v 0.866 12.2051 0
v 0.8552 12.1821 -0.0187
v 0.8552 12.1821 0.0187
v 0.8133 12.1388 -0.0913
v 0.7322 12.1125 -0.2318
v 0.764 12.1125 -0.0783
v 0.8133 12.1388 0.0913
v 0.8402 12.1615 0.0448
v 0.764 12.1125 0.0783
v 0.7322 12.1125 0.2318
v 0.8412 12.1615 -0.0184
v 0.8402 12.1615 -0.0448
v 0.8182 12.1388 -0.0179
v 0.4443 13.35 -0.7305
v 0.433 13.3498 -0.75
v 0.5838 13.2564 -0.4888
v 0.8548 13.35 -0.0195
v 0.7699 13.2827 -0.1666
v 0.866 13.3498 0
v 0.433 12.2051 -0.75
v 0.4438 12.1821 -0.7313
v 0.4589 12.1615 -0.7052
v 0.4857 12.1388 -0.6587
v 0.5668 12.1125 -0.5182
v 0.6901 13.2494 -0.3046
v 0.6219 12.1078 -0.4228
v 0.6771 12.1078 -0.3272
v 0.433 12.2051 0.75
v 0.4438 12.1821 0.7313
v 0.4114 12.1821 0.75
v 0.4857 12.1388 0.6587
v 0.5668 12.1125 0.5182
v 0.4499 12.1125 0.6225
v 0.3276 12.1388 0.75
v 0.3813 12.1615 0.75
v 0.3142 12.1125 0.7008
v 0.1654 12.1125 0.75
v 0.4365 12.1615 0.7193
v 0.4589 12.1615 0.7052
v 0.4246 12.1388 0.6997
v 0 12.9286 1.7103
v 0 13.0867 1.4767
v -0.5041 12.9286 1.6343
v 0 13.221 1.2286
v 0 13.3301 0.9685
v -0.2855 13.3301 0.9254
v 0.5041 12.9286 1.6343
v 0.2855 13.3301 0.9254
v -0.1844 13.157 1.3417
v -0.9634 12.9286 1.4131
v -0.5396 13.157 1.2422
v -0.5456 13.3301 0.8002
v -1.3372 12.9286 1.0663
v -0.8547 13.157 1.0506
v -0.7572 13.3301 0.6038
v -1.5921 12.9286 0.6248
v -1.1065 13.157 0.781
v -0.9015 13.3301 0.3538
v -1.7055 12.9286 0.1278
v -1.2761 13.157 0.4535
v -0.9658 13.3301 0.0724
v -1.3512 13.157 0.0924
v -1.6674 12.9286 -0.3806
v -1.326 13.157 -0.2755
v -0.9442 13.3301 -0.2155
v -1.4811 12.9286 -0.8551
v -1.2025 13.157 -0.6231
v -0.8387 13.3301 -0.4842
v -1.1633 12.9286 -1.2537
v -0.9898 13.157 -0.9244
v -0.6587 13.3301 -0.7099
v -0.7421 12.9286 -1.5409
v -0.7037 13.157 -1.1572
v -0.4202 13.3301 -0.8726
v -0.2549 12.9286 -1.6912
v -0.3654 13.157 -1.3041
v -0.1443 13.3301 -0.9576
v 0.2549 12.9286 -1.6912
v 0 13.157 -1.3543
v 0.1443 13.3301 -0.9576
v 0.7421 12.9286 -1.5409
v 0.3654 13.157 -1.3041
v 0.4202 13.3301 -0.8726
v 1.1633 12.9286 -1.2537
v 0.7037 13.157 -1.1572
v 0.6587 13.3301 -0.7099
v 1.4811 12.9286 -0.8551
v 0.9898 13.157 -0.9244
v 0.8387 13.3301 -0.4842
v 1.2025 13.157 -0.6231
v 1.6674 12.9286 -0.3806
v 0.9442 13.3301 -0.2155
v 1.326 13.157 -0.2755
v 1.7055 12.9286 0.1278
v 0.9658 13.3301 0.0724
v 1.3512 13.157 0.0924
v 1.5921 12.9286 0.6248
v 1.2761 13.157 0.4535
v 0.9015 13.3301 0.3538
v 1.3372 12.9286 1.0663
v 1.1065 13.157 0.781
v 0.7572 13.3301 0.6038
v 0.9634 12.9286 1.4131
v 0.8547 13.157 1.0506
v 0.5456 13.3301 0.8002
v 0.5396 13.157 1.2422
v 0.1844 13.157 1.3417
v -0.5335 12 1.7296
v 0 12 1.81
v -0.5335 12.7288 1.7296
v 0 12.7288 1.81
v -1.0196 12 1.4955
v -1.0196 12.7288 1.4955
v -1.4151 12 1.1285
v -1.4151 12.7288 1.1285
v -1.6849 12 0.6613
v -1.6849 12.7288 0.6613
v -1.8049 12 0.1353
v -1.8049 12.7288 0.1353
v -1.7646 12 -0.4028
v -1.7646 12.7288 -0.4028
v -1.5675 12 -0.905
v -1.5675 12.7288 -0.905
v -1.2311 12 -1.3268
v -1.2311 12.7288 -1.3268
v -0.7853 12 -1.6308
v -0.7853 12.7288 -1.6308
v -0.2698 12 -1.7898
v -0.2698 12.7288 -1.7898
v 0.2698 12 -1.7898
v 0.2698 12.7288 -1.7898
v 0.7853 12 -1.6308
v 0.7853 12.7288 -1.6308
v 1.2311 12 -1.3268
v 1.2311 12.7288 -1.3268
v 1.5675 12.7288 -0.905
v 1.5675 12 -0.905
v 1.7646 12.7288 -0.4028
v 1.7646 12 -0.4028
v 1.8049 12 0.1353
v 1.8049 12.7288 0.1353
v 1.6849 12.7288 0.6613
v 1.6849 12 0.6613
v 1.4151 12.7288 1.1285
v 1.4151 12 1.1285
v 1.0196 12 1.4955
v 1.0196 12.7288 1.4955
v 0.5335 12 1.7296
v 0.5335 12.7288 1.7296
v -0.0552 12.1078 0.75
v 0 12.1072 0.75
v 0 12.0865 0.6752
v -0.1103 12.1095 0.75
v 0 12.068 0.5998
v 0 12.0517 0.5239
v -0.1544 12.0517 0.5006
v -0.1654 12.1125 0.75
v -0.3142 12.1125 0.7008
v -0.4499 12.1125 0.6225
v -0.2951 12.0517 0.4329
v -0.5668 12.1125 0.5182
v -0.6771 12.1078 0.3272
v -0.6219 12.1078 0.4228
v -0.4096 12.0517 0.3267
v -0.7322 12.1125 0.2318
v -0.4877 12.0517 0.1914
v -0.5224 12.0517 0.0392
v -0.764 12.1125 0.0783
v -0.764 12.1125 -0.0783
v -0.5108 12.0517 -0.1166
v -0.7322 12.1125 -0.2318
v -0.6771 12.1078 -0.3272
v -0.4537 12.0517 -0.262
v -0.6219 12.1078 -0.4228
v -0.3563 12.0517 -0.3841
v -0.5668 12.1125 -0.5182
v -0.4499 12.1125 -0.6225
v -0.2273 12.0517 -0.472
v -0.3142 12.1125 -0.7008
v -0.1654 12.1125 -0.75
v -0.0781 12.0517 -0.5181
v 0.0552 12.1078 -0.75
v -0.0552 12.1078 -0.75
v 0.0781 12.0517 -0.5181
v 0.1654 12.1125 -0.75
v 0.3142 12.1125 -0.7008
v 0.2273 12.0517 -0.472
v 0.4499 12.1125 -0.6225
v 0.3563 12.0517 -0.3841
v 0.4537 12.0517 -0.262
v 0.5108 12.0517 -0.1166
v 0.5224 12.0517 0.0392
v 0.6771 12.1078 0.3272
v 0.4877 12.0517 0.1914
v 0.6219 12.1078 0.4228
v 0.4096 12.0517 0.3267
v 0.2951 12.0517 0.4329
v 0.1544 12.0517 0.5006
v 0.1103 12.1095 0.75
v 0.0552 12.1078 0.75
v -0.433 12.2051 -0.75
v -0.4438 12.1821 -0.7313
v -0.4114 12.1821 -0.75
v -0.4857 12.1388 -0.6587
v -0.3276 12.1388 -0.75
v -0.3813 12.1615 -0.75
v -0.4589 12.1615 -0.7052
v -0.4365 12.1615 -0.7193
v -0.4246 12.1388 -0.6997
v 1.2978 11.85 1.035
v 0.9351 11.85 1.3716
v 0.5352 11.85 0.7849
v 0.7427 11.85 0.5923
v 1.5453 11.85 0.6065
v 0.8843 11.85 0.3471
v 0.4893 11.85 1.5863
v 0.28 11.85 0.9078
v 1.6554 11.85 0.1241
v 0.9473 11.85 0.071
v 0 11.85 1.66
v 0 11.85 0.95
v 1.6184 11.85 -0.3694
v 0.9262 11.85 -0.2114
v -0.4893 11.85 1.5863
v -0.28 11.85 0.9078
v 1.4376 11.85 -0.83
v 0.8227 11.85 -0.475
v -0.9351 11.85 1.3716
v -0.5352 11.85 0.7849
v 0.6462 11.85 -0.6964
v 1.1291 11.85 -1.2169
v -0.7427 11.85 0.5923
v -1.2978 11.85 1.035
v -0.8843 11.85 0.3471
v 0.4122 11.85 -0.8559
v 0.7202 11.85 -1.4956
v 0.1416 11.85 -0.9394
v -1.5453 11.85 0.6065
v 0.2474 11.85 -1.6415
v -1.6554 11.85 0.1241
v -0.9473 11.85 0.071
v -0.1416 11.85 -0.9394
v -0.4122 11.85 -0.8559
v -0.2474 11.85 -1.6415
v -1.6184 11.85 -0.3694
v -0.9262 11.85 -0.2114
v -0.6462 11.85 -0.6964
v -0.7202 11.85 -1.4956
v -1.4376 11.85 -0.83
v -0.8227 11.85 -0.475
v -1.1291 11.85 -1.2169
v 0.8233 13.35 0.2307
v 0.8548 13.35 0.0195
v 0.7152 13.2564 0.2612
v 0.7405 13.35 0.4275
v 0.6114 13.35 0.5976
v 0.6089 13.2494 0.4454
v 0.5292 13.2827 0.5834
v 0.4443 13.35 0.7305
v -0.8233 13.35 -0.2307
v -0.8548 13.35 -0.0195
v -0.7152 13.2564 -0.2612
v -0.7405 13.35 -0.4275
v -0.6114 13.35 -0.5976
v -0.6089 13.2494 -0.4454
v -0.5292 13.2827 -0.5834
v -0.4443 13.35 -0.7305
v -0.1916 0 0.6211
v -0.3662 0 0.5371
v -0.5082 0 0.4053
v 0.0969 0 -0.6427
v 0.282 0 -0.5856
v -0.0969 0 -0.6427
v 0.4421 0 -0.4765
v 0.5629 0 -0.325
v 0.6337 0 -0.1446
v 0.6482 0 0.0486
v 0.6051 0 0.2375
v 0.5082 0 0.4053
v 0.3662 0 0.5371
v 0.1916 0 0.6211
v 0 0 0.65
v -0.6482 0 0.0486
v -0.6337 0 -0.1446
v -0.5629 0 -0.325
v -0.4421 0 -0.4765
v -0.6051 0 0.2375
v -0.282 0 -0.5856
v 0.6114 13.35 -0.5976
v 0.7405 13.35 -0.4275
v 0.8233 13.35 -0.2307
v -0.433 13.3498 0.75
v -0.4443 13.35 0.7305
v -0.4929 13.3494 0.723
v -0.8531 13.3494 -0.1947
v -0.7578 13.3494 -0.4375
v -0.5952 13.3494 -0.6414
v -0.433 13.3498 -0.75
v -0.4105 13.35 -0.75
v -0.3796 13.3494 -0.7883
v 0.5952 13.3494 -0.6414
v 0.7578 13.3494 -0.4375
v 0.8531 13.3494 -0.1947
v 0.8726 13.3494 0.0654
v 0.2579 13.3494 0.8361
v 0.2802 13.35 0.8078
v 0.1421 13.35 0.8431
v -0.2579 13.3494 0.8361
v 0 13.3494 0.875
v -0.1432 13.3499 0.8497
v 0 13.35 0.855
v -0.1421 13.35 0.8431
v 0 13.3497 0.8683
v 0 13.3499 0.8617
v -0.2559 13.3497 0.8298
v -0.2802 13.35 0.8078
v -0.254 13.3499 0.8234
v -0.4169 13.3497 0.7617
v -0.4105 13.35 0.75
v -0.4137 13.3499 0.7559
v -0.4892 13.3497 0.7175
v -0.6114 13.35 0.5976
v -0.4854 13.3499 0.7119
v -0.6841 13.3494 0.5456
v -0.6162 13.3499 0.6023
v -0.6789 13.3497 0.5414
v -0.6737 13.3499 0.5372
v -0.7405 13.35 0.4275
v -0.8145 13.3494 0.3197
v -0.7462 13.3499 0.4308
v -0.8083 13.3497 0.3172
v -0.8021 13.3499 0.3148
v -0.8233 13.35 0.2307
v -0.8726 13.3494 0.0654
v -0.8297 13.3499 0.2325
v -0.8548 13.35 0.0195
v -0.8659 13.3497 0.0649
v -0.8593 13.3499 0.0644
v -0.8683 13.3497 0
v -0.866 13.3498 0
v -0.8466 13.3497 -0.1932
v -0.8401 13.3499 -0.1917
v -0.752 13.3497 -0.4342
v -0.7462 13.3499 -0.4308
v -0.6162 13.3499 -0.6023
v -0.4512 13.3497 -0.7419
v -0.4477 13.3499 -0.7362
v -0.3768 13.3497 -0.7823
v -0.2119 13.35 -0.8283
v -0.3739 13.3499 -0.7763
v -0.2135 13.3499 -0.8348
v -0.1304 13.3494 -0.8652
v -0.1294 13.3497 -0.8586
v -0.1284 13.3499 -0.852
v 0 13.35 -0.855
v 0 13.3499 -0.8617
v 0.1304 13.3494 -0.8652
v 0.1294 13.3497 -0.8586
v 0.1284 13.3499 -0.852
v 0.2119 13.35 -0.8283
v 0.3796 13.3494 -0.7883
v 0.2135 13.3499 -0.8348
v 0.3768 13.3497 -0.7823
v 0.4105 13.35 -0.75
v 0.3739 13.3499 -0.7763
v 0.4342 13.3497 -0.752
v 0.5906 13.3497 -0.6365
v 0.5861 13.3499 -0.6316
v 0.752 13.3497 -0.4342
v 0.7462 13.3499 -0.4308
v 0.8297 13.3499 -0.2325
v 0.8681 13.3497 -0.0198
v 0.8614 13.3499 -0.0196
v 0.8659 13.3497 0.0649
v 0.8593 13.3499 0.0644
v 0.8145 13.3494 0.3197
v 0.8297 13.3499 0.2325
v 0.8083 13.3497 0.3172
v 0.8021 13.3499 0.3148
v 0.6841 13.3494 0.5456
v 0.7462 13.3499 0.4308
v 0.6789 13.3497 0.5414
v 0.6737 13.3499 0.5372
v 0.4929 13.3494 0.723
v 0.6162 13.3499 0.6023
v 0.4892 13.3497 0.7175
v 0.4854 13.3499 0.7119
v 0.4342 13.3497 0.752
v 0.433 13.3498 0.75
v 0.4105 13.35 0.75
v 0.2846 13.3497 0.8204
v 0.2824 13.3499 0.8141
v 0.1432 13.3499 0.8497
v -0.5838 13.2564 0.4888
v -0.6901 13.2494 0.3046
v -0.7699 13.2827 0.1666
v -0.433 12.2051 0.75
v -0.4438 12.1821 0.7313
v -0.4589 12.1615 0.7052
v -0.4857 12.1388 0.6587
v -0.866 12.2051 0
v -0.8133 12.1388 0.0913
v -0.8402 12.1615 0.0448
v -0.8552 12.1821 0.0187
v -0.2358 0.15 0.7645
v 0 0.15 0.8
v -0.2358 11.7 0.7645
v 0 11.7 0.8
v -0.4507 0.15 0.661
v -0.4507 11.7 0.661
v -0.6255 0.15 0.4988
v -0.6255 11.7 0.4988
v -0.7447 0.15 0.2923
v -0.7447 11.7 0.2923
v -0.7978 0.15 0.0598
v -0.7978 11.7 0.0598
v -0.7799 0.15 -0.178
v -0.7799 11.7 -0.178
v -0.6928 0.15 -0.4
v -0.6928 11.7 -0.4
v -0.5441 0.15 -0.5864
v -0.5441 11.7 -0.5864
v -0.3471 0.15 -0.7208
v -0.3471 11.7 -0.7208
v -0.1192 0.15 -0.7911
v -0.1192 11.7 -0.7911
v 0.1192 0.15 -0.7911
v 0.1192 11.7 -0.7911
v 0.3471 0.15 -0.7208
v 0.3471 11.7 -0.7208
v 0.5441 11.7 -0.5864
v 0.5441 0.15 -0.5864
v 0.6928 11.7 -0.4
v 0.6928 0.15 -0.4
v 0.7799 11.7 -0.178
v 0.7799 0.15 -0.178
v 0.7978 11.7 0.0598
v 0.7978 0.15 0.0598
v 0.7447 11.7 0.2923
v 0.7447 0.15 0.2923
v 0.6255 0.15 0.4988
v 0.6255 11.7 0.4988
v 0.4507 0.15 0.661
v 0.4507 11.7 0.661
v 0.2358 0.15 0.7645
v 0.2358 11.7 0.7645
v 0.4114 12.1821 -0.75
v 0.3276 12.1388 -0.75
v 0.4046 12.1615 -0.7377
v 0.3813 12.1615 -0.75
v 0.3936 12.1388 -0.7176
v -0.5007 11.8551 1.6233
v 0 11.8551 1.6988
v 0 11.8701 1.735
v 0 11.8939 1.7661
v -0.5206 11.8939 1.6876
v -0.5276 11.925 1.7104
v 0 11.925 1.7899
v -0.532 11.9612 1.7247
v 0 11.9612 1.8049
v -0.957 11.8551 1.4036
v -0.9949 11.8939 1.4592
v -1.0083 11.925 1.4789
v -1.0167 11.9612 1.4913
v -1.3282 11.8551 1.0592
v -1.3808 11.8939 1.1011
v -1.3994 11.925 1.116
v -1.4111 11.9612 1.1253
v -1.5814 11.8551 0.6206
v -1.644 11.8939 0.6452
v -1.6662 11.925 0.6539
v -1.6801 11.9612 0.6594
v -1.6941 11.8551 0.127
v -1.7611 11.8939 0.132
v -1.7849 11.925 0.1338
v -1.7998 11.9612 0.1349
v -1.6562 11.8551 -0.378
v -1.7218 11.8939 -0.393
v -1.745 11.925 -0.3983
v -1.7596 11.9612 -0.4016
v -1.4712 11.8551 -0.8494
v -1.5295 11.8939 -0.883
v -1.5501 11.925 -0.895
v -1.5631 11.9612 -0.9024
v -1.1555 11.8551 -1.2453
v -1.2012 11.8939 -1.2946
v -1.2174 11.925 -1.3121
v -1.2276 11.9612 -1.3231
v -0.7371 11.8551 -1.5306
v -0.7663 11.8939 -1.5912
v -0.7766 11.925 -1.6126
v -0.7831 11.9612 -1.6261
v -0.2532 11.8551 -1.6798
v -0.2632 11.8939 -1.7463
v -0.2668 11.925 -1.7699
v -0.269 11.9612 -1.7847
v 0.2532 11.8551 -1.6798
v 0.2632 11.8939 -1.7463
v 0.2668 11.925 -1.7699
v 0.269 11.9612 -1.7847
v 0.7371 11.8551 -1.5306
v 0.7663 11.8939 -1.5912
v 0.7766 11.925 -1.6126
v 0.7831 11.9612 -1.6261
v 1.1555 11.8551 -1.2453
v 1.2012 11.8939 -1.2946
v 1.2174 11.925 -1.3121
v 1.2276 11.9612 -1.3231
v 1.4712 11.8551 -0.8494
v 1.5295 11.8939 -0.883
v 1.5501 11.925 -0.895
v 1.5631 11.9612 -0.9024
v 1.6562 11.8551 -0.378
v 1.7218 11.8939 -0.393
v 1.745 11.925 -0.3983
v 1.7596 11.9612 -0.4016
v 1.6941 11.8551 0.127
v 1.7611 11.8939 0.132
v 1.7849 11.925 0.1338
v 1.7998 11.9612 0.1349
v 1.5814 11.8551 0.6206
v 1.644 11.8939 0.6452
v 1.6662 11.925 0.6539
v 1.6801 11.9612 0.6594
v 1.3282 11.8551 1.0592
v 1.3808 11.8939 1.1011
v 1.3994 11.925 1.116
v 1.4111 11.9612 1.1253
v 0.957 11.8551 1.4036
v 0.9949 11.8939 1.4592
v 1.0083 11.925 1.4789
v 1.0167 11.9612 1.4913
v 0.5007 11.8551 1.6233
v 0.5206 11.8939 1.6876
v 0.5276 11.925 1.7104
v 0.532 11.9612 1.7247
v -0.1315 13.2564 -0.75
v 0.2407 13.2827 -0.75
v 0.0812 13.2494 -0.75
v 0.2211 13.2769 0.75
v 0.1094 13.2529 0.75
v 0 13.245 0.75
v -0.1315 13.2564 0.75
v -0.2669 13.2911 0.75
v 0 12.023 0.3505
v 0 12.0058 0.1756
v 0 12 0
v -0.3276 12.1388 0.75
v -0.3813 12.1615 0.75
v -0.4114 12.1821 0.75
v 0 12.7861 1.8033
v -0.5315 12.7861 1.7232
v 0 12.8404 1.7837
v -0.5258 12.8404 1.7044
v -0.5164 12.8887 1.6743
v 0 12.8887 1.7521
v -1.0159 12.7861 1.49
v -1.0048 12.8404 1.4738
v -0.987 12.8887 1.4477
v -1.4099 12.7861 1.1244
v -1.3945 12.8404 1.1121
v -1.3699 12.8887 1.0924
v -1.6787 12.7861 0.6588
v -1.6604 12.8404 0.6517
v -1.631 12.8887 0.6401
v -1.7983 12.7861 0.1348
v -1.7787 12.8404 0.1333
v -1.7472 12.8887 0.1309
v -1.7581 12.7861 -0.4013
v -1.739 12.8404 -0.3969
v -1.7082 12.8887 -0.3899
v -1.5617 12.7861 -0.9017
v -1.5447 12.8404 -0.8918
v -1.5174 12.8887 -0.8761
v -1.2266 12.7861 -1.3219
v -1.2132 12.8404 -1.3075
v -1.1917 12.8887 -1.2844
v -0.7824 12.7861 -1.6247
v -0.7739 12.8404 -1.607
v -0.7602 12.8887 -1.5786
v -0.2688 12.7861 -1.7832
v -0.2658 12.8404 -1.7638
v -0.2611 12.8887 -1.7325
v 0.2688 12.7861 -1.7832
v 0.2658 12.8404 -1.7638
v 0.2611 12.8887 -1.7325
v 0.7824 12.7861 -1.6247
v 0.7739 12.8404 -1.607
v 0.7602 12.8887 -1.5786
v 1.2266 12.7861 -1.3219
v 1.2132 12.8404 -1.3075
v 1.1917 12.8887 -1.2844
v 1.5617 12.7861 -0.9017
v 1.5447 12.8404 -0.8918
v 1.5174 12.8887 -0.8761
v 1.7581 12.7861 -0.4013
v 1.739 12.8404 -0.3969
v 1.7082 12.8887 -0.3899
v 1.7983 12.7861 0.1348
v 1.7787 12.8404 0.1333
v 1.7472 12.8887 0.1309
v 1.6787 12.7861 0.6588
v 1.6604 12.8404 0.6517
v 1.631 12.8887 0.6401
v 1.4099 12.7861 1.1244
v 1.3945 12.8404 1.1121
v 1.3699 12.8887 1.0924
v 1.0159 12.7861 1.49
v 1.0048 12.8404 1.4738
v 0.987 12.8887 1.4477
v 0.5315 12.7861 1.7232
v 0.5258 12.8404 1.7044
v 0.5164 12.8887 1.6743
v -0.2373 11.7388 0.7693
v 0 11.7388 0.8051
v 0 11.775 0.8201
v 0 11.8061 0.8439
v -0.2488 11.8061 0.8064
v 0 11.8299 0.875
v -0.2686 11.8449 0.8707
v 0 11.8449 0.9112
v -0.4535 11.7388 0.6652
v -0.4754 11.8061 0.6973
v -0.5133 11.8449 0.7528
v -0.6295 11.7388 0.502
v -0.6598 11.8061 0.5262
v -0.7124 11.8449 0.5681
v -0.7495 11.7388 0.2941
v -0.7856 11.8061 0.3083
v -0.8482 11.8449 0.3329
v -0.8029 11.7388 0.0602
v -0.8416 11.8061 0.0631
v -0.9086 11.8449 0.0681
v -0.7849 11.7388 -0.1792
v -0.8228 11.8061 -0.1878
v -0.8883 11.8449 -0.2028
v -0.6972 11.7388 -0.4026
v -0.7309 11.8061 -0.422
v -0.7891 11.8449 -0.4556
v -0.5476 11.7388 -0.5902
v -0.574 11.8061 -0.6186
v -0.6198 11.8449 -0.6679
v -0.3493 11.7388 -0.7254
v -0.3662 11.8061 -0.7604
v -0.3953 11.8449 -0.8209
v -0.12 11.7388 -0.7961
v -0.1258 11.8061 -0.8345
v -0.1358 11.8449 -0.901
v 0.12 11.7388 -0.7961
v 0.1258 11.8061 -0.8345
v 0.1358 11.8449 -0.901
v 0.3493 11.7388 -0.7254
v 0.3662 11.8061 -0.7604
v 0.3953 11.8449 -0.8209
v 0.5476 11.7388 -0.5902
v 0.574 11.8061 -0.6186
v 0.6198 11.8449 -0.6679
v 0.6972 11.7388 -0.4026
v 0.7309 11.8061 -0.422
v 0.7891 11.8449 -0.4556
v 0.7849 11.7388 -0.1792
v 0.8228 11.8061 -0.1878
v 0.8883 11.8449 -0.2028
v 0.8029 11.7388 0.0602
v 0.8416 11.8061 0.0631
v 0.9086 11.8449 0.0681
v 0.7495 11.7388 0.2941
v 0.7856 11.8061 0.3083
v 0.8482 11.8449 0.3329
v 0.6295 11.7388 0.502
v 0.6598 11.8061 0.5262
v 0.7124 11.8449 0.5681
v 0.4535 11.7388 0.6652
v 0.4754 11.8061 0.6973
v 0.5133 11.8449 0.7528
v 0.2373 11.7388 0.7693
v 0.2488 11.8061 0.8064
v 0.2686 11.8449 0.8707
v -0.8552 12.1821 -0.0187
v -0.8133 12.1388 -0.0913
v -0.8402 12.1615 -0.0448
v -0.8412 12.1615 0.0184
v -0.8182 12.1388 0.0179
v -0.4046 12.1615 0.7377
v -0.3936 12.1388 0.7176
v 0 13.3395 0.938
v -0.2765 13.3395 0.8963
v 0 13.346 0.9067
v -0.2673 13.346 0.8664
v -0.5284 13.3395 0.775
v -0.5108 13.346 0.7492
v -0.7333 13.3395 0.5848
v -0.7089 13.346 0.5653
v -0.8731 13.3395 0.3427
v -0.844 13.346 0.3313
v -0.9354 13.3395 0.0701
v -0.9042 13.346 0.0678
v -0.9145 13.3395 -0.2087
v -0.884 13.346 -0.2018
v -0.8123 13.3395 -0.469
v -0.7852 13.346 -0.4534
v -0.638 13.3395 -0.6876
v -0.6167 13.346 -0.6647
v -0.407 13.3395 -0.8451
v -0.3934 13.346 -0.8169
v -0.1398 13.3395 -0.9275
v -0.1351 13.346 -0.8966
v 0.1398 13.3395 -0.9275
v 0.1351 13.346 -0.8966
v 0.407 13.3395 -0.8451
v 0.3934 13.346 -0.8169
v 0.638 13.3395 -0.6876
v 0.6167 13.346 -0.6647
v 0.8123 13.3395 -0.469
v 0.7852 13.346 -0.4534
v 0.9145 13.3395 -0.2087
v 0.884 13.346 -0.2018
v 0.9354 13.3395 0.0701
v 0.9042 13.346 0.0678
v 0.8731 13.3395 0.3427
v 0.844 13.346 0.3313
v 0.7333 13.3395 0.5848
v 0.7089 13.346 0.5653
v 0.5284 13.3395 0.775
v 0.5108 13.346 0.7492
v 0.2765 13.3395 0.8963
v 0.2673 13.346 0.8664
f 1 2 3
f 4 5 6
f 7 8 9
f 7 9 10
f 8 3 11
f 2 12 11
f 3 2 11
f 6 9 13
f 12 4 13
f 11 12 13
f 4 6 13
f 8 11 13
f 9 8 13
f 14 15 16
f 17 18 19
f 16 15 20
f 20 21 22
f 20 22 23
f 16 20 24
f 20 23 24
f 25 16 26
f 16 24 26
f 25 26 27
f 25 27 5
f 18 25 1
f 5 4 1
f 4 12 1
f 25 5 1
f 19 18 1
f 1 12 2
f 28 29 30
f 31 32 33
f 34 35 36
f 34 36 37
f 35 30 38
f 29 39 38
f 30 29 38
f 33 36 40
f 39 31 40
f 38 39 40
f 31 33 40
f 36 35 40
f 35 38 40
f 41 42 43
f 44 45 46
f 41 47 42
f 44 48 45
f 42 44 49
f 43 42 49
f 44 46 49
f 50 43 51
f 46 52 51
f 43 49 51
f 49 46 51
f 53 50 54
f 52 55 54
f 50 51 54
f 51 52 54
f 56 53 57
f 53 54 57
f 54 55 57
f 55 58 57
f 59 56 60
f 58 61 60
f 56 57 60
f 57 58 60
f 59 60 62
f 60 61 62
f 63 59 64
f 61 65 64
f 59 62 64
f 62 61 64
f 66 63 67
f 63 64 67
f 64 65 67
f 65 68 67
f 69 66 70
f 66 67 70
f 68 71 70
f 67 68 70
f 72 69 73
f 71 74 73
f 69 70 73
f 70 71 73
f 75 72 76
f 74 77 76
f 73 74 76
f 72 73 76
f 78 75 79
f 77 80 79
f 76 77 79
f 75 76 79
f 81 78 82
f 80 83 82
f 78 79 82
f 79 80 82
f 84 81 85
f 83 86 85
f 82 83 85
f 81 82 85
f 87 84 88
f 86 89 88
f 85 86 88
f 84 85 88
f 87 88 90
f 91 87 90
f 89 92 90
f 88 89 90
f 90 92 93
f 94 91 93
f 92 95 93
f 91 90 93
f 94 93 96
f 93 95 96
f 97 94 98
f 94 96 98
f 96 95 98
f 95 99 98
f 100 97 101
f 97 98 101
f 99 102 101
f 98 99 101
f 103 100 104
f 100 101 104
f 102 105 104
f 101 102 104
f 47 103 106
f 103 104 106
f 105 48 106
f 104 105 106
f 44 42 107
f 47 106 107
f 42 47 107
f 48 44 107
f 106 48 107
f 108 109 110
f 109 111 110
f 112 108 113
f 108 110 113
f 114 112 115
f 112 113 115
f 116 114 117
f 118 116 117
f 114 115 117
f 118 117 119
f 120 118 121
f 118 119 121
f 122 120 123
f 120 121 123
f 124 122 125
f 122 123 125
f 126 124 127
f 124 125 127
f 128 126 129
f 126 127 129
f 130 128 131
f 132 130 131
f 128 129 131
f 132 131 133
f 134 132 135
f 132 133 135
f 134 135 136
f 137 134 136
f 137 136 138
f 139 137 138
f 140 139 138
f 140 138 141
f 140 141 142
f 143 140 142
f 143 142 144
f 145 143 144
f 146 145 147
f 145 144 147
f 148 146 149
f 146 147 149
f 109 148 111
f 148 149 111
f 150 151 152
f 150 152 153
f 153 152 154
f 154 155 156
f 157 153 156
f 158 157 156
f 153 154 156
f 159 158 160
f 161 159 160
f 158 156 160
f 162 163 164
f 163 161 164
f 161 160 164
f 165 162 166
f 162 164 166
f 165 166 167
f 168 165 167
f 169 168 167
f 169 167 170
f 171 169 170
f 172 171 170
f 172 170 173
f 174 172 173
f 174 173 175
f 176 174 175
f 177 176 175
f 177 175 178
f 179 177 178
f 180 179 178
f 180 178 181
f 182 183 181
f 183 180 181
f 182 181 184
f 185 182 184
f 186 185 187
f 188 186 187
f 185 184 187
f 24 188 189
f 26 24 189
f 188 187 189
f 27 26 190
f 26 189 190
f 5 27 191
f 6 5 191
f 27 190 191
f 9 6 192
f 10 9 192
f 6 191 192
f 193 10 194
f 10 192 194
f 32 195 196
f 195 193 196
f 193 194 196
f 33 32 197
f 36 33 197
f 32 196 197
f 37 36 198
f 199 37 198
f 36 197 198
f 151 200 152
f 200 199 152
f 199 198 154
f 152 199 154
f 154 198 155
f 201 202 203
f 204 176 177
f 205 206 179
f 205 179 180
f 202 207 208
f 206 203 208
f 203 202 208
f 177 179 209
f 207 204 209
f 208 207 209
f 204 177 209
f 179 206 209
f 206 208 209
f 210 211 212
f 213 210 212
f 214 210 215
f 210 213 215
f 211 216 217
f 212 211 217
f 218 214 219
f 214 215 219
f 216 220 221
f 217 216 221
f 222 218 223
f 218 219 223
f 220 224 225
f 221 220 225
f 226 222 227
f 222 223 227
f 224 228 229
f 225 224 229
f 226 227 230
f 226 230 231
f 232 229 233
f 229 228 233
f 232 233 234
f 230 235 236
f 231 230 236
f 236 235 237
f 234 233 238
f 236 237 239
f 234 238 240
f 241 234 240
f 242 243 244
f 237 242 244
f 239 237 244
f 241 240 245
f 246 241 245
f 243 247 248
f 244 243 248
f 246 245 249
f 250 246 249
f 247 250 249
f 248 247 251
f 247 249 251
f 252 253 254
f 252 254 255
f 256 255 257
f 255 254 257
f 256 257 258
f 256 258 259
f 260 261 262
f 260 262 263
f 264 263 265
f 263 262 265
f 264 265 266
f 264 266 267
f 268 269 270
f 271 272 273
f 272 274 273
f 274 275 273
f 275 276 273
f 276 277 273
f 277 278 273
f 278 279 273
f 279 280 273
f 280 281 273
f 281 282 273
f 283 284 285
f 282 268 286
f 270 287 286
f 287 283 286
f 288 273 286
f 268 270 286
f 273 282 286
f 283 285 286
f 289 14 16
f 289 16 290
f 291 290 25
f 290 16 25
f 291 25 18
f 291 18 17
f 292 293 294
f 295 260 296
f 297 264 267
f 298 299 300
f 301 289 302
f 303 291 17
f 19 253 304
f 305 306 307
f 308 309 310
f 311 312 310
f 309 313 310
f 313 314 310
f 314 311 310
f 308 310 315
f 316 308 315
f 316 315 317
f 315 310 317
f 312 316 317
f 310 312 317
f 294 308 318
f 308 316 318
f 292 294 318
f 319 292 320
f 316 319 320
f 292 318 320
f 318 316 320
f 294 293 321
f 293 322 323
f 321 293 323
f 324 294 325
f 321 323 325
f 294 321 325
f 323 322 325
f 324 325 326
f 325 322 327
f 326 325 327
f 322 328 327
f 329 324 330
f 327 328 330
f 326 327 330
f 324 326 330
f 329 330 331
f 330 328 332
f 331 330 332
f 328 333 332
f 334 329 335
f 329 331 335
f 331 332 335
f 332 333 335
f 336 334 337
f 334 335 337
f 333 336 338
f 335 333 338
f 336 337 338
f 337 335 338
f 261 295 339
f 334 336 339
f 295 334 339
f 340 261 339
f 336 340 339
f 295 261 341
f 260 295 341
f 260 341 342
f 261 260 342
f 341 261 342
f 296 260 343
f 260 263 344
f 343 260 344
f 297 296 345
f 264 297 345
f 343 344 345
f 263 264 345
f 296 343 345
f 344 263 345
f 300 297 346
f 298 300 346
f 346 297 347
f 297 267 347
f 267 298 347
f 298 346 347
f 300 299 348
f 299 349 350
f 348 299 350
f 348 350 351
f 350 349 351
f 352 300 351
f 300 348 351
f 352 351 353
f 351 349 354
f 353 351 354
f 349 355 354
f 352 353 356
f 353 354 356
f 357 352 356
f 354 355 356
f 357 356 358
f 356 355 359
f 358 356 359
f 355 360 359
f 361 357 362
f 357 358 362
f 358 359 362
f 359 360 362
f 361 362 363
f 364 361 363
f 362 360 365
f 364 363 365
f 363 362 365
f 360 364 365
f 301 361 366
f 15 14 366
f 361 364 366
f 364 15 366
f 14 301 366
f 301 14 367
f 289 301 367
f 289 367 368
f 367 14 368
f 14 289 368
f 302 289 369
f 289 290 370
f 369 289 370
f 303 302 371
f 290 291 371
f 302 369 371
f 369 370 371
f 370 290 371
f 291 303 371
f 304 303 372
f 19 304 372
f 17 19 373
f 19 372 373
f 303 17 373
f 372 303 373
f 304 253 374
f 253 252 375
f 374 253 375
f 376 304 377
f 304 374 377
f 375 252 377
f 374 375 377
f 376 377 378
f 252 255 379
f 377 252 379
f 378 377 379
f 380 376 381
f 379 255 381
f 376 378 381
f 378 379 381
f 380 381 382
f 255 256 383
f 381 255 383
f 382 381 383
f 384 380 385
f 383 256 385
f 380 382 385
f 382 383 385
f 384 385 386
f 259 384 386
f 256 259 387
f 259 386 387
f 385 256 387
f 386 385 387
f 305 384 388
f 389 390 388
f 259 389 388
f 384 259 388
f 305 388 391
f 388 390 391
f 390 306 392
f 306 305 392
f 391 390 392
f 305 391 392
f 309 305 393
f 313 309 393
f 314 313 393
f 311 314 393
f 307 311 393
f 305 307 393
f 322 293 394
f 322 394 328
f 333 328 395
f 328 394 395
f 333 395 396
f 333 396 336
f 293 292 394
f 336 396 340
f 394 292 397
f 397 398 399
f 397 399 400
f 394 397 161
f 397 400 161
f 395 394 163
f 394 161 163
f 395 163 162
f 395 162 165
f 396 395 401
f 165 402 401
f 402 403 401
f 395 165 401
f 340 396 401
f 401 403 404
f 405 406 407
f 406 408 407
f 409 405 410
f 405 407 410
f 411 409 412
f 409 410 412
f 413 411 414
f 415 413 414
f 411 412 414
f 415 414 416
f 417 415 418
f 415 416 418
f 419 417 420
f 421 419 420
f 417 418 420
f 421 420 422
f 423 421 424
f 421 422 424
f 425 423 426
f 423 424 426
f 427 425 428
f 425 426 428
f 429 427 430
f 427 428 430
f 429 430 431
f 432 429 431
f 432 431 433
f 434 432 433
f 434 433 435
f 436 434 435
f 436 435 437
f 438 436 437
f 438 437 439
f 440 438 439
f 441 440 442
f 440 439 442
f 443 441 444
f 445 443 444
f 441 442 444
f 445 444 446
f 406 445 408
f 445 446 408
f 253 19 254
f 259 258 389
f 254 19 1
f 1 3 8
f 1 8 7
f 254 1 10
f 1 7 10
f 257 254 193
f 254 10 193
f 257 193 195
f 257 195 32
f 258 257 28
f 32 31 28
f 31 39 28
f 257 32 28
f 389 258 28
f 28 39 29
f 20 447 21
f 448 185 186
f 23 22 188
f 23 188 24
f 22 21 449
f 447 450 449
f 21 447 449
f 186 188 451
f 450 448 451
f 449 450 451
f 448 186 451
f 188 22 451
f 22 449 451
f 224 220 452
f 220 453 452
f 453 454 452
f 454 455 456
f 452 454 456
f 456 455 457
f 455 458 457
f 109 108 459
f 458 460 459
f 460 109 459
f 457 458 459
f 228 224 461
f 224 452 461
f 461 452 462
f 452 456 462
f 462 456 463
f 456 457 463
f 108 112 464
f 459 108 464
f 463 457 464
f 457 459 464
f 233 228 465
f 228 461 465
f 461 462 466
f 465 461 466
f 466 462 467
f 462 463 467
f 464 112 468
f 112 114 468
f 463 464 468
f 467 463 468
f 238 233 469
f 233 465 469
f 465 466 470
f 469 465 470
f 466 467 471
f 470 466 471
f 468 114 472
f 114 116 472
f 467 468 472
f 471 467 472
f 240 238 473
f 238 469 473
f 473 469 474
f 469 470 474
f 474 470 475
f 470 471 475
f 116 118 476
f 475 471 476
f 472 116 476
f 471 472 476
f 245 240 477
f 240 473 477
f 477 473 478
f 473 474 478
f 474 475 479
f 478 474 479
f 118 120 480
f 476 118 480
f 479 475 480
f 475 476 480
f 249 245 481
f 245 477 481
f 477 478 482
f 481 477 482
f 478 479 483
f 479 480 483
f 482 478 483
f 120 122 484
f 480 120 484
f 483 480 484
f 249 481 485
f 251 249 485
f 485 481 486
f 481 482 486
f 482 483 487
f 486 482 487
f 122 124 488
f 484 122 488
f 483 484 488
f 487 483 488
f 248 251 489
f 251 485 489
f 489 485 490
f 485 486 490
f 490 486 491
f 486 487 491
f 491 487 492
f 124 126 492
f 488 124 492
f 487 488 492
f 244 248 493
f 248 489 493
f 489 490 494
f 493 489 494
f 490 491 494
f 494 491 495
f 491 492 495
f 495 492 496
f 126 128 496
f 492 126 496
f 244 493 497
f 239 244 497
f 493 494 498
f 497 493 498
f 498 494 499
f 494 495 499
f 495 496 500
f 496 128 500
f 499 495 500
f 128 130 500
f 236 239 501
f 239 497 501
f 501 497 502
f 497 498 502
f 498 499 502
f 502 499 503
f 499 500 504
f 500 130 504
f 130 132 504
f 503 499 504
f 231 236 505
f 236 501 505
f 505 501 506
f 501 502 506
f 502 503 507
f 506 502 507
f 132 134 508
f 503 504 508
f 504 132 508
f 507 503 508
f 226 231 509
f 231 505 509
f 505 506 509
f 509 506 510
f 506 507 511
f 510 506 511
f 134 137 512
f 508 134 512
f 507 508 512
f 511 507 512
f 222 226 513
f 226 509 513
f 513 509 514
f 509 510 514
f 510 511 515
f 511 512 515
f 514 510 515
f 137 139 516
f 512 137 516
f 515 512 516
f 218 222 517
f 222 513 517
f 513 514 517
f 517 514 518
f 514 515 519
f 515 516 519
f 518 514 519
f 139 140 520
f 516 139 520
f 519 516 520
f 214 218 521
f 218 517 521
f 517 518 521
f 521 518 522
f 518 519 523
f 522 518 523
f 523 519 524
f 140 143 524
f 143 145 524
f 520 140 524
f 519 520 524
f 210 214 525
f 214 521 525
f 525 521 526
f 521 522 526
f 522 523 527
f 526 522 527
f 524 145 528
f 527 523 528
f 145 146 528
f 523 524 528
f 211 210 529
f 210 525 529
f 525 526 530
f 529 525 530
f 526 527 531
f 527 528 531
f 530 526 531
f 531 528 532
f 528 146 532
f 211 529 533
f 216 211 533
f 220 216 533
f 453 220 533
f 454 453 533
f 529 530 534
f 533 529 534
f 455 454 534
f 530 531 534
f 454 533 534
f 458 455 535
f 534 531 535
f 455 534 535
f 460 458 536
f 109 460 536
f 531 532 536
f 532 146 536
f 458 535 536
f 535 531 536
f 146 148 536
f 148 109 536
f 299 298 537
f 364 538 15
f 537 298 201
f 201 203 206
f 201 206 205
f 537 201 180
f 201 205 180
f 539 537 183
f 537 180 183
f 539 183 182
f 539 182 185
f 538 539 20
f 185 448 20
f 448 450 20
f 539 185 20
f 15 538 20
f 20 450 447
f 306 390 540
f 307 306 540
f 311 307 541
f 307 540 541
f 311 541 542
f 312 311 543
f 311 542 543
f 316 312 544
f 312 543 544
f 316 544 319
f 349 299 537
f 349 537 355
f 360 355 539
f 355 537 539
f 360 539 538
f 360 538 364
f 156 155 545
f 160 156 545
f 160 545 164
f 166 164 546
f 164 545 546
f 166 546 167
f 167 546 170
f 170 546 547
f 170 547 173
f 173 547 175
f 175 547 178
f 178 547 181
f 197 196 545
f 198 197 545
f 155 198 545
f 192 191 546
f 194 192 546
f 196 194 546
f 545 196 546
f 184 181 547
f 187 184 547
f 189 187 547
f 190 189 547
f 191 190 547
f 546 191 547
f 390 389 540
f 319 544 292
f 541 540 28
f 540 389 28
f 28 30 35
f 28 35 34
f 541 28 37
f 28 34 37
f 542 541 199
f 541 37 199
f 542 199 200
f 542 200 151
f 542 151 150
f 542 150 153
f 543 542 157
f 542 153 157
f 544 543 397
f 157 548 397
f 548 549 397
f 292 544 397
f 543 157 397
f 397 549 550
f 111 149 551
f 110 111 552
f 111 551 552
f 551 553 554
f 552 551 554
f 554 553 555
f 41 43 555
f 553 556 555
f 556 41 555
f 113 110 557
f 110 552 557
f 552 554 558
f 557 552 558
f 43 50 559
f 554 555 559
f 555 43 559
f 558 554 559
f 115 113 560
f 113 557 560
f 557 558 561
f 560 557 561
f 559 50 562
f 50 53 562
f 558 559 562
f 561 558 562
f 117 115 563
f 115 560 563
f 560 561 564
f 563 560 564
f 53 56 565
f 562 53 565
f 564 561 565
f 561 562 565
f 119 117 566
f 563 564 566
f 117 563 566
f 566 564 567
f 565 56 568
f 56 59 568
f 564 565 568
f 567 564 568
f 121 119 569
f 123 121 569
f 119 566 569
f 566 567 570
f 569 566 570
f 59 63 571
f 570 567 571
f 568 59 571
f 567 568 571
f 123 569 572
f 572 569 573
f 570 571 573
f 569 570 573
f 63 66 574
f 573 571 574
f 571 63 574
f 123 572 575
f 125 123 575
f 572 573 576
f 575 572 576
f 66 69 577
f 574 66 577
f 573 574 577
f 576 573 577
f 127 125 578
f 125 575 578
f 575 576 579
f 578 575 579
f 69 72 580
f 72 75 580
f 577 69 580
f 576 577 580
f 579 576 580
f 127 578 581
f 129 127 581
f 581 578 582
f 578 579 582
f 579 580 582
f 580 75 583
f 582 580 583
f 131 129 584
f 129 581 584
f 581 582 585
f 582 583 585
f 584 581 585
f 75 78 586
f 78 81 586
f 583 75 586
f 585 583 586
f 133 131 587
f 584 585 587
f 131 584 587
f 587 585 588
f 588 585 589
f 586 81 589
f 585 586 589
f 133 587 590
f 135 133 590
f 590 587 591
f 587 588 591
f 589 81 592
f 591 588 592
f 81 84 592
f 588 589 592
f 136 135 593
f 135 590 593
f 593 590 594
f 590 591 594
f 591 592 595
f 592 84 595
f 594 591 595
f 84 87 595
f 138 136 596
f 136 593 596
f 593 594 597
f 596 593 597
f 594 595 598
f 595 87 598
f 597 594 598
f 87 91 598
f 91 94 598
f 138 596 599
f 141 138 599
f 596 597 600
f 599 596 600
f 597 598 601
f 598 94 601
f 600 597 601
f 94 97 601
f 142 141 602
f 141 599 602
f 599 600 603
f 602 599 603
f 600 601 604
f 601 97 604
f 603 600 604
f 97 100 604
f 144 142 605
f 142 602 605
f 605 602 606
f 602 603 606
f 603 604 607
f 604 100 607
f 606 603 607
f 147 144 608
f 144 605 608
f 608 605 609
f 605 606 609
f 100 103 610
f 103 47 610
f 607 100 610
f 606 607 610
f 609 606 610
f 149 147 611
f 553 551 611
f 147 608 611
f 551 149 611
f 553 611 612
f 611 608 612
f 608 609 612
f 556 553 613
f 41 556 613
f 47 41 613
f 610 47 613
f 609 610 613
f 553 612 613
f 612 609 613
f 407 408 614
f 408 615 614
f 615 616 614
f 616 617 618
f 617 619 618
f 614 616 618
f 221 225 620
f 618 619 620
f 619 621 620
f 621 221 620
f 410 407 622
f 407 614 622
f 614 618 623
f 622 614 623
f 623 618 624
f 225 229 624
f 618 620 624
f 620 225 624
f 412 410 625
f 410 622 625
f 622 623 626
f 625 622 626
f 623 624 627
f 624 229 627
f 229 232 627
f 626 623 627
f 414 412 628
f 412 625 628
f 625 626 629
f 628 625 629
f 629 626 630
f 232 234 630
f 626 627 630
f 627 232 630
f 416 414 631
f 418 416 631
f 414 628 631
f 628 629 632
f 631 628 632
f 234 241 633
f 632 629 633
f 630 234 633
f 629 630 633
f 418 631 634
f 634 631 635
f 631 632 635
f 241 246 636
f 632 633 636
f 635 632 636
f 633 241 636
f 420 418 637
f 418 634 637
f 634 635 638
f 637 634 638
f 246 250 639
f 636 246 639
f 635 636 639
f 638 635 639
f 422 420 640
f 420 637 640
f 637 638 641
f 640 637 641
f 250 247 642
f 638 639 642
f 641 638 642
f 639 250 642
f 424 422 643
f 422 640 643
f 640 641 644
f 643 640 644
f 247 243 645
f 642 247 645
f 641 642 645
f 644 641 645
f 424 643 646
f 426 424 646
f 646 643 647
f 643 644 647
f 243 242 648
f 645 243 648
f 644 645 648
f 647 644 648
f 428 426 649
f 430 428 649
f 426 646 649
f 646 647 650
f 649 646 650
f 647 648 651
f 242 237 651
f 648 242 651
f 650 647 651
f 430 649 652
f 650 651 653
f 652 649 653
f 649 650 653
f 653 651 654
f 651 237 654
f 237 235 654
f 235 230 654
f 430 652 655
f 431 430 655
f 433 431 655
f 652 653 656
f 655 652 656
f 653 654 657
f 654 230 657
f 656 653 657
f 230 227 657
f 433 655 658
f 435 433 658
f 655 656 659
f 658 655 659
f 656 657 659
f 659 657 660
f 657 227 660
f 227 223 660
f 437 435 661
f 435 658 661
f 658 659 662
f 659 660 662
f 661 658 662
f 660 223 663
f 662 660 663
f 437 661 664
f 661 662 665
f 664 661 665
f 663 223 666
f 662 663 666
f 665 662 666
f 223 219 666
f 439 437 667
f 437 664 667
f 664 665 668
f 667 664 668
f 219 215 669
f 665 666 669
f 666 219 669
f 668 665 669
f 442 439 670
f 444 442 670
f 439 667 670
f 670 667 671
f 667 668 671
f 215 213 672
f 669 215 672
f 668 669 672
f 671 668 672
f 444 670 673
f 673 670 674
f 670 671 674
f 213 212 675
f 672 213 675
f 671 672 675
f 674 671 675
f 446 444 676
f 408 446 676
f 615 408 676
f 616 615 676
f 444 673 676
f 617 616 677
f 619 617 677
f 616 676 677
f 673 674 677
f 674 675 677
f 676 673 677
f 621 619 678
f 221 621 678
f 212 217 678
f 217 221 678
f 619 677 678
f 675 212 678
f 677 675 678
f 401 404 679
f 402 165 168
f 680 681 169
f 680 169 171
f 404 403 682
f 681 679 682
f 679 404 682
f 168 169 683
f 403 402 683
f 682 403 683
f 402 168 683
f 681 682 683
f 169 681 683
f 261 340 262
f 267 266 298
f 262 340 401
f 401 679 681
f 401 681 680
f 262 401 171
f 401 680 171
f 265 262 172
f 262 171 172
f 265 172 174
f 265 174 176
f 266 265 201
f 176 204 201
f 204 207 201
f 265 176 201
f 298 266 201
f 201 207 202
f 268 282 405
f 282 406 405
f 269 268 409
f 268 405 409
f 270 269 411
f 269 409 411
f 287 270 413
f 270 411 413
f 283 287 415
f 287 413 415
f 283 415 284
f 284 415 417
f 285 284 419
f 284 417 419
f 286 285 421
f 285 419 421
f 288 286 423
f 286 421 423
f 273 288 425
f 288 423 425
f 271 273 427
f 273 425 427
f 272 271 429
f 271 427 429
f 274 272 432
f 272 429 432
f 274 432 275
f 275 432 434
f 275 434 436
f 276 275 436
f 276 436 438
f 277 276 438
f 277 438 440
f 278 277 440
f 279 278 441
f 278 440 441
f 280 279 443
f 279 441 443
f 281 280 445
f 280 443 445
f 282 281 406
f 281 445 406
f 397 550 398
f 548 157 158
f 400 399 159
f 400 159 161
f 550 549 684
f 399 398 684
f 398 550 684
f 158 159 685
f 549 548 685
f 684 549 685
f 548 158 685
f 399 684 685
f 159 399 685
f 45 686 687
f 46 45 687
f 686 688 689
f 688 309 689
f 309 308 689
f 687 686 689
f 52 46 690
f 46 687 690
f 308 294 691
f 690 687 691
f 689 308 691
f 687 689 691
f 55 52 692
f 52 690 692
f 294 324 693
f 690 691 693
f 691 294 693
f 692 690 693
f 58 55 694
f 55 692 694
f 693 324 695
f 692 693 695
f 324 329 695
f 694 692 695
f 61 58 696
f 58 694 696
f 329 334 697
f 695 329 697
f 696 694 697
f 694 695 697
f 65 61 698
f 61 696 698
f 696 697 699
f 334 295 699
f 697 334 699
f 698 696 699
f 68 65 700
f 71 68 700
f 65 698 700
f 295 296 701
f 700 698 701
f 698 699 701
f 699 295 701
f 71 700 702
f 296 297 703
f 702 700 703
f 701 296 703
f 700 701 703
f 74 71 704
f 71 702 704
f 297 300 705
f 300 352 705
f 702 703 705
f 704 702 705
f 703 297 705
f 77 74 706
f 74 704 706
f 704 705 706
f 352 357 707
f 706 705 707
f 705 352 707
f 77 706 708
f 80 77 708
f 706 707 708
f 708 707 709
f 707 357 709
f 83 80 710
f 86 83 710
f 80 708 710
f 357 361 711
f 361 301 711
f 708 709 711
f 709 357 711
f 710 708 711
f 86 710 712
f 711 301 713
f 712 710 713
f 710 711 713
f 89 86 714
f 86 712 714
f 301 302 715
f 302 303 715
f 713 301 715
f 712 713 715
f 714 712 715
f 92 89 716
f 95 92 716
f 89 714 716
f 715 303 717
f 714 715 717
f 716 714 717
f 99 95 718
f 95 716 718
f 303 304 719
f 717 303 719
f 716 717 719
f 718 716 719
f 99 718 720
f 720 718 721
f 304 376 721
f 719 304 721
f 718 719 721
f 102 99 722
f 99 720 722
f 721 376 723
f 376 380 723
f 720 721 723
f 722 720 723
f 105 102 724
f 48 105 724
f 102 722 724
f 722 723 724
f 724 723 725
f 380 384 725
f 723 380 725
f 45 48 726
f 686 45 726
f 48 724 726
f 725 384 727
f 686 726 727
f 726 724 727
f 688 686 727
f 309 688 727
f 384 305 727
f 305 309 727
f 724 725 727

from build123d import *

# Parameters (mm, degrees)
CUT_EXTRUDE2_DEPTH = 13.123312269


with BuildPart() as part:
    # Sketch1 → Revolve1 (revolve)
    with BuildSketch(Plane(origin=(0, 0, 0), x_dir=(0, 0, -1), z_dir=(1, 0, 0))):
        with BuildLine():
            ThreePointArc((0.8, 11.7), (0.843933983, 11.806066017), (0.95, 11.85))
            Line((0.95, 11.85), (1.66, 11.85))
            ThreePointArc((1.66, 11.85), (1.766066017, 11.893933983), (1.81, 12))
            Line((1.81, 12), (1.81, 12.728765944))
            ThreePointArc((1.81, 12.728765944), (1.783686321, 12.840410154), (1.710284562, 12.928552205))
            ThreePointArc((1.710284562, 12.928552205), (1.354338624, 13.156968158), (0.968464524, 13.330093943))
            ThreePointArc((0.968464524, 13.330093943), (0.922426778, 13.343109085), (0.875, 13.349399447))
            Line((0.875, 13.349399447), (0.875, 12.256185485))
            ThreePointArc((0.875, 12.256185485), (0.845317103, 12.166609847), (0.768016069, 12.112485736))
            ThreePointArc((0.768016069, 12.112485736), (0.646674627, 12.079247272), (0.523906049, 12.051744226))
            ThreePointArc((0.523906049, 12.051744226), (0.263227569, 12.012967451), (0, 12))
            Line((0, 12), (0, 0))
            Line((0, 0), (0.65, 0))
            Line((0.65, 0), (0.8, 0.15))
            Line((0.8, 0.15), (0.8, 11.7))
        make_face()
    revolve(axis=Axis((0, 13.5, 0), (0, -1, 0)))


with BuildPart() as body_2:
    # Sketch1<3> → Revolve2 (revolve)
    with BuildSketch(Plane(origin=(0, 0, 0), x_dir=(0, 0, -1), z_dir=(1, 0, 0))):
        with BuildLine():
            Line((0.875, 12.256185485), (0.875, 13.349399447))
            ThreePointArc((0.875, 13.349399447), (0.865004507, 13.349849828), (0.855, 13.35))
            Line((0.855, 13.35), (0.725, 13.22))
            Line((0.725, 13.22), (0.725, 12.29691396))
            ThreePointArc((0.725, 12.29691396), (0.668295774, 12.138368245), (0.523906049, 12.051744226))
            ThreePointArc((0.523906049, 12.051744226), (0.646674627, 12.079247272), (0.768016069, 12.112485736))
            ThreePointArc((0.768016069, 12.112485736), (0.845317103, 12.166609847), (0.875, 12.256185485))
        make_face()
    revolve(axis=Axis((0, 13.5, 0), (0, -1, 0)))

    # Sketch2 → Cut-Extrude2 (cut, through all)
    with BuildSketch(Plane.XZ.offset(-11.85)):
        Polygon((-0.433012702, 0.75), (-0.866025404, 0), (-0.433012702, -0.75), (0.433012702, -0.75), (0.866025404, 0), (0.433012702, 0.75), align=None)
    extrude(amount=-CUT_EXTRUDE2_DEPTH, mode=Mode.SUBTRACT)


with BuildPart() as part_1:
    add(part.part)

    # Combine1: union body 2
    add(body_2.part)


solid = part_1.part
